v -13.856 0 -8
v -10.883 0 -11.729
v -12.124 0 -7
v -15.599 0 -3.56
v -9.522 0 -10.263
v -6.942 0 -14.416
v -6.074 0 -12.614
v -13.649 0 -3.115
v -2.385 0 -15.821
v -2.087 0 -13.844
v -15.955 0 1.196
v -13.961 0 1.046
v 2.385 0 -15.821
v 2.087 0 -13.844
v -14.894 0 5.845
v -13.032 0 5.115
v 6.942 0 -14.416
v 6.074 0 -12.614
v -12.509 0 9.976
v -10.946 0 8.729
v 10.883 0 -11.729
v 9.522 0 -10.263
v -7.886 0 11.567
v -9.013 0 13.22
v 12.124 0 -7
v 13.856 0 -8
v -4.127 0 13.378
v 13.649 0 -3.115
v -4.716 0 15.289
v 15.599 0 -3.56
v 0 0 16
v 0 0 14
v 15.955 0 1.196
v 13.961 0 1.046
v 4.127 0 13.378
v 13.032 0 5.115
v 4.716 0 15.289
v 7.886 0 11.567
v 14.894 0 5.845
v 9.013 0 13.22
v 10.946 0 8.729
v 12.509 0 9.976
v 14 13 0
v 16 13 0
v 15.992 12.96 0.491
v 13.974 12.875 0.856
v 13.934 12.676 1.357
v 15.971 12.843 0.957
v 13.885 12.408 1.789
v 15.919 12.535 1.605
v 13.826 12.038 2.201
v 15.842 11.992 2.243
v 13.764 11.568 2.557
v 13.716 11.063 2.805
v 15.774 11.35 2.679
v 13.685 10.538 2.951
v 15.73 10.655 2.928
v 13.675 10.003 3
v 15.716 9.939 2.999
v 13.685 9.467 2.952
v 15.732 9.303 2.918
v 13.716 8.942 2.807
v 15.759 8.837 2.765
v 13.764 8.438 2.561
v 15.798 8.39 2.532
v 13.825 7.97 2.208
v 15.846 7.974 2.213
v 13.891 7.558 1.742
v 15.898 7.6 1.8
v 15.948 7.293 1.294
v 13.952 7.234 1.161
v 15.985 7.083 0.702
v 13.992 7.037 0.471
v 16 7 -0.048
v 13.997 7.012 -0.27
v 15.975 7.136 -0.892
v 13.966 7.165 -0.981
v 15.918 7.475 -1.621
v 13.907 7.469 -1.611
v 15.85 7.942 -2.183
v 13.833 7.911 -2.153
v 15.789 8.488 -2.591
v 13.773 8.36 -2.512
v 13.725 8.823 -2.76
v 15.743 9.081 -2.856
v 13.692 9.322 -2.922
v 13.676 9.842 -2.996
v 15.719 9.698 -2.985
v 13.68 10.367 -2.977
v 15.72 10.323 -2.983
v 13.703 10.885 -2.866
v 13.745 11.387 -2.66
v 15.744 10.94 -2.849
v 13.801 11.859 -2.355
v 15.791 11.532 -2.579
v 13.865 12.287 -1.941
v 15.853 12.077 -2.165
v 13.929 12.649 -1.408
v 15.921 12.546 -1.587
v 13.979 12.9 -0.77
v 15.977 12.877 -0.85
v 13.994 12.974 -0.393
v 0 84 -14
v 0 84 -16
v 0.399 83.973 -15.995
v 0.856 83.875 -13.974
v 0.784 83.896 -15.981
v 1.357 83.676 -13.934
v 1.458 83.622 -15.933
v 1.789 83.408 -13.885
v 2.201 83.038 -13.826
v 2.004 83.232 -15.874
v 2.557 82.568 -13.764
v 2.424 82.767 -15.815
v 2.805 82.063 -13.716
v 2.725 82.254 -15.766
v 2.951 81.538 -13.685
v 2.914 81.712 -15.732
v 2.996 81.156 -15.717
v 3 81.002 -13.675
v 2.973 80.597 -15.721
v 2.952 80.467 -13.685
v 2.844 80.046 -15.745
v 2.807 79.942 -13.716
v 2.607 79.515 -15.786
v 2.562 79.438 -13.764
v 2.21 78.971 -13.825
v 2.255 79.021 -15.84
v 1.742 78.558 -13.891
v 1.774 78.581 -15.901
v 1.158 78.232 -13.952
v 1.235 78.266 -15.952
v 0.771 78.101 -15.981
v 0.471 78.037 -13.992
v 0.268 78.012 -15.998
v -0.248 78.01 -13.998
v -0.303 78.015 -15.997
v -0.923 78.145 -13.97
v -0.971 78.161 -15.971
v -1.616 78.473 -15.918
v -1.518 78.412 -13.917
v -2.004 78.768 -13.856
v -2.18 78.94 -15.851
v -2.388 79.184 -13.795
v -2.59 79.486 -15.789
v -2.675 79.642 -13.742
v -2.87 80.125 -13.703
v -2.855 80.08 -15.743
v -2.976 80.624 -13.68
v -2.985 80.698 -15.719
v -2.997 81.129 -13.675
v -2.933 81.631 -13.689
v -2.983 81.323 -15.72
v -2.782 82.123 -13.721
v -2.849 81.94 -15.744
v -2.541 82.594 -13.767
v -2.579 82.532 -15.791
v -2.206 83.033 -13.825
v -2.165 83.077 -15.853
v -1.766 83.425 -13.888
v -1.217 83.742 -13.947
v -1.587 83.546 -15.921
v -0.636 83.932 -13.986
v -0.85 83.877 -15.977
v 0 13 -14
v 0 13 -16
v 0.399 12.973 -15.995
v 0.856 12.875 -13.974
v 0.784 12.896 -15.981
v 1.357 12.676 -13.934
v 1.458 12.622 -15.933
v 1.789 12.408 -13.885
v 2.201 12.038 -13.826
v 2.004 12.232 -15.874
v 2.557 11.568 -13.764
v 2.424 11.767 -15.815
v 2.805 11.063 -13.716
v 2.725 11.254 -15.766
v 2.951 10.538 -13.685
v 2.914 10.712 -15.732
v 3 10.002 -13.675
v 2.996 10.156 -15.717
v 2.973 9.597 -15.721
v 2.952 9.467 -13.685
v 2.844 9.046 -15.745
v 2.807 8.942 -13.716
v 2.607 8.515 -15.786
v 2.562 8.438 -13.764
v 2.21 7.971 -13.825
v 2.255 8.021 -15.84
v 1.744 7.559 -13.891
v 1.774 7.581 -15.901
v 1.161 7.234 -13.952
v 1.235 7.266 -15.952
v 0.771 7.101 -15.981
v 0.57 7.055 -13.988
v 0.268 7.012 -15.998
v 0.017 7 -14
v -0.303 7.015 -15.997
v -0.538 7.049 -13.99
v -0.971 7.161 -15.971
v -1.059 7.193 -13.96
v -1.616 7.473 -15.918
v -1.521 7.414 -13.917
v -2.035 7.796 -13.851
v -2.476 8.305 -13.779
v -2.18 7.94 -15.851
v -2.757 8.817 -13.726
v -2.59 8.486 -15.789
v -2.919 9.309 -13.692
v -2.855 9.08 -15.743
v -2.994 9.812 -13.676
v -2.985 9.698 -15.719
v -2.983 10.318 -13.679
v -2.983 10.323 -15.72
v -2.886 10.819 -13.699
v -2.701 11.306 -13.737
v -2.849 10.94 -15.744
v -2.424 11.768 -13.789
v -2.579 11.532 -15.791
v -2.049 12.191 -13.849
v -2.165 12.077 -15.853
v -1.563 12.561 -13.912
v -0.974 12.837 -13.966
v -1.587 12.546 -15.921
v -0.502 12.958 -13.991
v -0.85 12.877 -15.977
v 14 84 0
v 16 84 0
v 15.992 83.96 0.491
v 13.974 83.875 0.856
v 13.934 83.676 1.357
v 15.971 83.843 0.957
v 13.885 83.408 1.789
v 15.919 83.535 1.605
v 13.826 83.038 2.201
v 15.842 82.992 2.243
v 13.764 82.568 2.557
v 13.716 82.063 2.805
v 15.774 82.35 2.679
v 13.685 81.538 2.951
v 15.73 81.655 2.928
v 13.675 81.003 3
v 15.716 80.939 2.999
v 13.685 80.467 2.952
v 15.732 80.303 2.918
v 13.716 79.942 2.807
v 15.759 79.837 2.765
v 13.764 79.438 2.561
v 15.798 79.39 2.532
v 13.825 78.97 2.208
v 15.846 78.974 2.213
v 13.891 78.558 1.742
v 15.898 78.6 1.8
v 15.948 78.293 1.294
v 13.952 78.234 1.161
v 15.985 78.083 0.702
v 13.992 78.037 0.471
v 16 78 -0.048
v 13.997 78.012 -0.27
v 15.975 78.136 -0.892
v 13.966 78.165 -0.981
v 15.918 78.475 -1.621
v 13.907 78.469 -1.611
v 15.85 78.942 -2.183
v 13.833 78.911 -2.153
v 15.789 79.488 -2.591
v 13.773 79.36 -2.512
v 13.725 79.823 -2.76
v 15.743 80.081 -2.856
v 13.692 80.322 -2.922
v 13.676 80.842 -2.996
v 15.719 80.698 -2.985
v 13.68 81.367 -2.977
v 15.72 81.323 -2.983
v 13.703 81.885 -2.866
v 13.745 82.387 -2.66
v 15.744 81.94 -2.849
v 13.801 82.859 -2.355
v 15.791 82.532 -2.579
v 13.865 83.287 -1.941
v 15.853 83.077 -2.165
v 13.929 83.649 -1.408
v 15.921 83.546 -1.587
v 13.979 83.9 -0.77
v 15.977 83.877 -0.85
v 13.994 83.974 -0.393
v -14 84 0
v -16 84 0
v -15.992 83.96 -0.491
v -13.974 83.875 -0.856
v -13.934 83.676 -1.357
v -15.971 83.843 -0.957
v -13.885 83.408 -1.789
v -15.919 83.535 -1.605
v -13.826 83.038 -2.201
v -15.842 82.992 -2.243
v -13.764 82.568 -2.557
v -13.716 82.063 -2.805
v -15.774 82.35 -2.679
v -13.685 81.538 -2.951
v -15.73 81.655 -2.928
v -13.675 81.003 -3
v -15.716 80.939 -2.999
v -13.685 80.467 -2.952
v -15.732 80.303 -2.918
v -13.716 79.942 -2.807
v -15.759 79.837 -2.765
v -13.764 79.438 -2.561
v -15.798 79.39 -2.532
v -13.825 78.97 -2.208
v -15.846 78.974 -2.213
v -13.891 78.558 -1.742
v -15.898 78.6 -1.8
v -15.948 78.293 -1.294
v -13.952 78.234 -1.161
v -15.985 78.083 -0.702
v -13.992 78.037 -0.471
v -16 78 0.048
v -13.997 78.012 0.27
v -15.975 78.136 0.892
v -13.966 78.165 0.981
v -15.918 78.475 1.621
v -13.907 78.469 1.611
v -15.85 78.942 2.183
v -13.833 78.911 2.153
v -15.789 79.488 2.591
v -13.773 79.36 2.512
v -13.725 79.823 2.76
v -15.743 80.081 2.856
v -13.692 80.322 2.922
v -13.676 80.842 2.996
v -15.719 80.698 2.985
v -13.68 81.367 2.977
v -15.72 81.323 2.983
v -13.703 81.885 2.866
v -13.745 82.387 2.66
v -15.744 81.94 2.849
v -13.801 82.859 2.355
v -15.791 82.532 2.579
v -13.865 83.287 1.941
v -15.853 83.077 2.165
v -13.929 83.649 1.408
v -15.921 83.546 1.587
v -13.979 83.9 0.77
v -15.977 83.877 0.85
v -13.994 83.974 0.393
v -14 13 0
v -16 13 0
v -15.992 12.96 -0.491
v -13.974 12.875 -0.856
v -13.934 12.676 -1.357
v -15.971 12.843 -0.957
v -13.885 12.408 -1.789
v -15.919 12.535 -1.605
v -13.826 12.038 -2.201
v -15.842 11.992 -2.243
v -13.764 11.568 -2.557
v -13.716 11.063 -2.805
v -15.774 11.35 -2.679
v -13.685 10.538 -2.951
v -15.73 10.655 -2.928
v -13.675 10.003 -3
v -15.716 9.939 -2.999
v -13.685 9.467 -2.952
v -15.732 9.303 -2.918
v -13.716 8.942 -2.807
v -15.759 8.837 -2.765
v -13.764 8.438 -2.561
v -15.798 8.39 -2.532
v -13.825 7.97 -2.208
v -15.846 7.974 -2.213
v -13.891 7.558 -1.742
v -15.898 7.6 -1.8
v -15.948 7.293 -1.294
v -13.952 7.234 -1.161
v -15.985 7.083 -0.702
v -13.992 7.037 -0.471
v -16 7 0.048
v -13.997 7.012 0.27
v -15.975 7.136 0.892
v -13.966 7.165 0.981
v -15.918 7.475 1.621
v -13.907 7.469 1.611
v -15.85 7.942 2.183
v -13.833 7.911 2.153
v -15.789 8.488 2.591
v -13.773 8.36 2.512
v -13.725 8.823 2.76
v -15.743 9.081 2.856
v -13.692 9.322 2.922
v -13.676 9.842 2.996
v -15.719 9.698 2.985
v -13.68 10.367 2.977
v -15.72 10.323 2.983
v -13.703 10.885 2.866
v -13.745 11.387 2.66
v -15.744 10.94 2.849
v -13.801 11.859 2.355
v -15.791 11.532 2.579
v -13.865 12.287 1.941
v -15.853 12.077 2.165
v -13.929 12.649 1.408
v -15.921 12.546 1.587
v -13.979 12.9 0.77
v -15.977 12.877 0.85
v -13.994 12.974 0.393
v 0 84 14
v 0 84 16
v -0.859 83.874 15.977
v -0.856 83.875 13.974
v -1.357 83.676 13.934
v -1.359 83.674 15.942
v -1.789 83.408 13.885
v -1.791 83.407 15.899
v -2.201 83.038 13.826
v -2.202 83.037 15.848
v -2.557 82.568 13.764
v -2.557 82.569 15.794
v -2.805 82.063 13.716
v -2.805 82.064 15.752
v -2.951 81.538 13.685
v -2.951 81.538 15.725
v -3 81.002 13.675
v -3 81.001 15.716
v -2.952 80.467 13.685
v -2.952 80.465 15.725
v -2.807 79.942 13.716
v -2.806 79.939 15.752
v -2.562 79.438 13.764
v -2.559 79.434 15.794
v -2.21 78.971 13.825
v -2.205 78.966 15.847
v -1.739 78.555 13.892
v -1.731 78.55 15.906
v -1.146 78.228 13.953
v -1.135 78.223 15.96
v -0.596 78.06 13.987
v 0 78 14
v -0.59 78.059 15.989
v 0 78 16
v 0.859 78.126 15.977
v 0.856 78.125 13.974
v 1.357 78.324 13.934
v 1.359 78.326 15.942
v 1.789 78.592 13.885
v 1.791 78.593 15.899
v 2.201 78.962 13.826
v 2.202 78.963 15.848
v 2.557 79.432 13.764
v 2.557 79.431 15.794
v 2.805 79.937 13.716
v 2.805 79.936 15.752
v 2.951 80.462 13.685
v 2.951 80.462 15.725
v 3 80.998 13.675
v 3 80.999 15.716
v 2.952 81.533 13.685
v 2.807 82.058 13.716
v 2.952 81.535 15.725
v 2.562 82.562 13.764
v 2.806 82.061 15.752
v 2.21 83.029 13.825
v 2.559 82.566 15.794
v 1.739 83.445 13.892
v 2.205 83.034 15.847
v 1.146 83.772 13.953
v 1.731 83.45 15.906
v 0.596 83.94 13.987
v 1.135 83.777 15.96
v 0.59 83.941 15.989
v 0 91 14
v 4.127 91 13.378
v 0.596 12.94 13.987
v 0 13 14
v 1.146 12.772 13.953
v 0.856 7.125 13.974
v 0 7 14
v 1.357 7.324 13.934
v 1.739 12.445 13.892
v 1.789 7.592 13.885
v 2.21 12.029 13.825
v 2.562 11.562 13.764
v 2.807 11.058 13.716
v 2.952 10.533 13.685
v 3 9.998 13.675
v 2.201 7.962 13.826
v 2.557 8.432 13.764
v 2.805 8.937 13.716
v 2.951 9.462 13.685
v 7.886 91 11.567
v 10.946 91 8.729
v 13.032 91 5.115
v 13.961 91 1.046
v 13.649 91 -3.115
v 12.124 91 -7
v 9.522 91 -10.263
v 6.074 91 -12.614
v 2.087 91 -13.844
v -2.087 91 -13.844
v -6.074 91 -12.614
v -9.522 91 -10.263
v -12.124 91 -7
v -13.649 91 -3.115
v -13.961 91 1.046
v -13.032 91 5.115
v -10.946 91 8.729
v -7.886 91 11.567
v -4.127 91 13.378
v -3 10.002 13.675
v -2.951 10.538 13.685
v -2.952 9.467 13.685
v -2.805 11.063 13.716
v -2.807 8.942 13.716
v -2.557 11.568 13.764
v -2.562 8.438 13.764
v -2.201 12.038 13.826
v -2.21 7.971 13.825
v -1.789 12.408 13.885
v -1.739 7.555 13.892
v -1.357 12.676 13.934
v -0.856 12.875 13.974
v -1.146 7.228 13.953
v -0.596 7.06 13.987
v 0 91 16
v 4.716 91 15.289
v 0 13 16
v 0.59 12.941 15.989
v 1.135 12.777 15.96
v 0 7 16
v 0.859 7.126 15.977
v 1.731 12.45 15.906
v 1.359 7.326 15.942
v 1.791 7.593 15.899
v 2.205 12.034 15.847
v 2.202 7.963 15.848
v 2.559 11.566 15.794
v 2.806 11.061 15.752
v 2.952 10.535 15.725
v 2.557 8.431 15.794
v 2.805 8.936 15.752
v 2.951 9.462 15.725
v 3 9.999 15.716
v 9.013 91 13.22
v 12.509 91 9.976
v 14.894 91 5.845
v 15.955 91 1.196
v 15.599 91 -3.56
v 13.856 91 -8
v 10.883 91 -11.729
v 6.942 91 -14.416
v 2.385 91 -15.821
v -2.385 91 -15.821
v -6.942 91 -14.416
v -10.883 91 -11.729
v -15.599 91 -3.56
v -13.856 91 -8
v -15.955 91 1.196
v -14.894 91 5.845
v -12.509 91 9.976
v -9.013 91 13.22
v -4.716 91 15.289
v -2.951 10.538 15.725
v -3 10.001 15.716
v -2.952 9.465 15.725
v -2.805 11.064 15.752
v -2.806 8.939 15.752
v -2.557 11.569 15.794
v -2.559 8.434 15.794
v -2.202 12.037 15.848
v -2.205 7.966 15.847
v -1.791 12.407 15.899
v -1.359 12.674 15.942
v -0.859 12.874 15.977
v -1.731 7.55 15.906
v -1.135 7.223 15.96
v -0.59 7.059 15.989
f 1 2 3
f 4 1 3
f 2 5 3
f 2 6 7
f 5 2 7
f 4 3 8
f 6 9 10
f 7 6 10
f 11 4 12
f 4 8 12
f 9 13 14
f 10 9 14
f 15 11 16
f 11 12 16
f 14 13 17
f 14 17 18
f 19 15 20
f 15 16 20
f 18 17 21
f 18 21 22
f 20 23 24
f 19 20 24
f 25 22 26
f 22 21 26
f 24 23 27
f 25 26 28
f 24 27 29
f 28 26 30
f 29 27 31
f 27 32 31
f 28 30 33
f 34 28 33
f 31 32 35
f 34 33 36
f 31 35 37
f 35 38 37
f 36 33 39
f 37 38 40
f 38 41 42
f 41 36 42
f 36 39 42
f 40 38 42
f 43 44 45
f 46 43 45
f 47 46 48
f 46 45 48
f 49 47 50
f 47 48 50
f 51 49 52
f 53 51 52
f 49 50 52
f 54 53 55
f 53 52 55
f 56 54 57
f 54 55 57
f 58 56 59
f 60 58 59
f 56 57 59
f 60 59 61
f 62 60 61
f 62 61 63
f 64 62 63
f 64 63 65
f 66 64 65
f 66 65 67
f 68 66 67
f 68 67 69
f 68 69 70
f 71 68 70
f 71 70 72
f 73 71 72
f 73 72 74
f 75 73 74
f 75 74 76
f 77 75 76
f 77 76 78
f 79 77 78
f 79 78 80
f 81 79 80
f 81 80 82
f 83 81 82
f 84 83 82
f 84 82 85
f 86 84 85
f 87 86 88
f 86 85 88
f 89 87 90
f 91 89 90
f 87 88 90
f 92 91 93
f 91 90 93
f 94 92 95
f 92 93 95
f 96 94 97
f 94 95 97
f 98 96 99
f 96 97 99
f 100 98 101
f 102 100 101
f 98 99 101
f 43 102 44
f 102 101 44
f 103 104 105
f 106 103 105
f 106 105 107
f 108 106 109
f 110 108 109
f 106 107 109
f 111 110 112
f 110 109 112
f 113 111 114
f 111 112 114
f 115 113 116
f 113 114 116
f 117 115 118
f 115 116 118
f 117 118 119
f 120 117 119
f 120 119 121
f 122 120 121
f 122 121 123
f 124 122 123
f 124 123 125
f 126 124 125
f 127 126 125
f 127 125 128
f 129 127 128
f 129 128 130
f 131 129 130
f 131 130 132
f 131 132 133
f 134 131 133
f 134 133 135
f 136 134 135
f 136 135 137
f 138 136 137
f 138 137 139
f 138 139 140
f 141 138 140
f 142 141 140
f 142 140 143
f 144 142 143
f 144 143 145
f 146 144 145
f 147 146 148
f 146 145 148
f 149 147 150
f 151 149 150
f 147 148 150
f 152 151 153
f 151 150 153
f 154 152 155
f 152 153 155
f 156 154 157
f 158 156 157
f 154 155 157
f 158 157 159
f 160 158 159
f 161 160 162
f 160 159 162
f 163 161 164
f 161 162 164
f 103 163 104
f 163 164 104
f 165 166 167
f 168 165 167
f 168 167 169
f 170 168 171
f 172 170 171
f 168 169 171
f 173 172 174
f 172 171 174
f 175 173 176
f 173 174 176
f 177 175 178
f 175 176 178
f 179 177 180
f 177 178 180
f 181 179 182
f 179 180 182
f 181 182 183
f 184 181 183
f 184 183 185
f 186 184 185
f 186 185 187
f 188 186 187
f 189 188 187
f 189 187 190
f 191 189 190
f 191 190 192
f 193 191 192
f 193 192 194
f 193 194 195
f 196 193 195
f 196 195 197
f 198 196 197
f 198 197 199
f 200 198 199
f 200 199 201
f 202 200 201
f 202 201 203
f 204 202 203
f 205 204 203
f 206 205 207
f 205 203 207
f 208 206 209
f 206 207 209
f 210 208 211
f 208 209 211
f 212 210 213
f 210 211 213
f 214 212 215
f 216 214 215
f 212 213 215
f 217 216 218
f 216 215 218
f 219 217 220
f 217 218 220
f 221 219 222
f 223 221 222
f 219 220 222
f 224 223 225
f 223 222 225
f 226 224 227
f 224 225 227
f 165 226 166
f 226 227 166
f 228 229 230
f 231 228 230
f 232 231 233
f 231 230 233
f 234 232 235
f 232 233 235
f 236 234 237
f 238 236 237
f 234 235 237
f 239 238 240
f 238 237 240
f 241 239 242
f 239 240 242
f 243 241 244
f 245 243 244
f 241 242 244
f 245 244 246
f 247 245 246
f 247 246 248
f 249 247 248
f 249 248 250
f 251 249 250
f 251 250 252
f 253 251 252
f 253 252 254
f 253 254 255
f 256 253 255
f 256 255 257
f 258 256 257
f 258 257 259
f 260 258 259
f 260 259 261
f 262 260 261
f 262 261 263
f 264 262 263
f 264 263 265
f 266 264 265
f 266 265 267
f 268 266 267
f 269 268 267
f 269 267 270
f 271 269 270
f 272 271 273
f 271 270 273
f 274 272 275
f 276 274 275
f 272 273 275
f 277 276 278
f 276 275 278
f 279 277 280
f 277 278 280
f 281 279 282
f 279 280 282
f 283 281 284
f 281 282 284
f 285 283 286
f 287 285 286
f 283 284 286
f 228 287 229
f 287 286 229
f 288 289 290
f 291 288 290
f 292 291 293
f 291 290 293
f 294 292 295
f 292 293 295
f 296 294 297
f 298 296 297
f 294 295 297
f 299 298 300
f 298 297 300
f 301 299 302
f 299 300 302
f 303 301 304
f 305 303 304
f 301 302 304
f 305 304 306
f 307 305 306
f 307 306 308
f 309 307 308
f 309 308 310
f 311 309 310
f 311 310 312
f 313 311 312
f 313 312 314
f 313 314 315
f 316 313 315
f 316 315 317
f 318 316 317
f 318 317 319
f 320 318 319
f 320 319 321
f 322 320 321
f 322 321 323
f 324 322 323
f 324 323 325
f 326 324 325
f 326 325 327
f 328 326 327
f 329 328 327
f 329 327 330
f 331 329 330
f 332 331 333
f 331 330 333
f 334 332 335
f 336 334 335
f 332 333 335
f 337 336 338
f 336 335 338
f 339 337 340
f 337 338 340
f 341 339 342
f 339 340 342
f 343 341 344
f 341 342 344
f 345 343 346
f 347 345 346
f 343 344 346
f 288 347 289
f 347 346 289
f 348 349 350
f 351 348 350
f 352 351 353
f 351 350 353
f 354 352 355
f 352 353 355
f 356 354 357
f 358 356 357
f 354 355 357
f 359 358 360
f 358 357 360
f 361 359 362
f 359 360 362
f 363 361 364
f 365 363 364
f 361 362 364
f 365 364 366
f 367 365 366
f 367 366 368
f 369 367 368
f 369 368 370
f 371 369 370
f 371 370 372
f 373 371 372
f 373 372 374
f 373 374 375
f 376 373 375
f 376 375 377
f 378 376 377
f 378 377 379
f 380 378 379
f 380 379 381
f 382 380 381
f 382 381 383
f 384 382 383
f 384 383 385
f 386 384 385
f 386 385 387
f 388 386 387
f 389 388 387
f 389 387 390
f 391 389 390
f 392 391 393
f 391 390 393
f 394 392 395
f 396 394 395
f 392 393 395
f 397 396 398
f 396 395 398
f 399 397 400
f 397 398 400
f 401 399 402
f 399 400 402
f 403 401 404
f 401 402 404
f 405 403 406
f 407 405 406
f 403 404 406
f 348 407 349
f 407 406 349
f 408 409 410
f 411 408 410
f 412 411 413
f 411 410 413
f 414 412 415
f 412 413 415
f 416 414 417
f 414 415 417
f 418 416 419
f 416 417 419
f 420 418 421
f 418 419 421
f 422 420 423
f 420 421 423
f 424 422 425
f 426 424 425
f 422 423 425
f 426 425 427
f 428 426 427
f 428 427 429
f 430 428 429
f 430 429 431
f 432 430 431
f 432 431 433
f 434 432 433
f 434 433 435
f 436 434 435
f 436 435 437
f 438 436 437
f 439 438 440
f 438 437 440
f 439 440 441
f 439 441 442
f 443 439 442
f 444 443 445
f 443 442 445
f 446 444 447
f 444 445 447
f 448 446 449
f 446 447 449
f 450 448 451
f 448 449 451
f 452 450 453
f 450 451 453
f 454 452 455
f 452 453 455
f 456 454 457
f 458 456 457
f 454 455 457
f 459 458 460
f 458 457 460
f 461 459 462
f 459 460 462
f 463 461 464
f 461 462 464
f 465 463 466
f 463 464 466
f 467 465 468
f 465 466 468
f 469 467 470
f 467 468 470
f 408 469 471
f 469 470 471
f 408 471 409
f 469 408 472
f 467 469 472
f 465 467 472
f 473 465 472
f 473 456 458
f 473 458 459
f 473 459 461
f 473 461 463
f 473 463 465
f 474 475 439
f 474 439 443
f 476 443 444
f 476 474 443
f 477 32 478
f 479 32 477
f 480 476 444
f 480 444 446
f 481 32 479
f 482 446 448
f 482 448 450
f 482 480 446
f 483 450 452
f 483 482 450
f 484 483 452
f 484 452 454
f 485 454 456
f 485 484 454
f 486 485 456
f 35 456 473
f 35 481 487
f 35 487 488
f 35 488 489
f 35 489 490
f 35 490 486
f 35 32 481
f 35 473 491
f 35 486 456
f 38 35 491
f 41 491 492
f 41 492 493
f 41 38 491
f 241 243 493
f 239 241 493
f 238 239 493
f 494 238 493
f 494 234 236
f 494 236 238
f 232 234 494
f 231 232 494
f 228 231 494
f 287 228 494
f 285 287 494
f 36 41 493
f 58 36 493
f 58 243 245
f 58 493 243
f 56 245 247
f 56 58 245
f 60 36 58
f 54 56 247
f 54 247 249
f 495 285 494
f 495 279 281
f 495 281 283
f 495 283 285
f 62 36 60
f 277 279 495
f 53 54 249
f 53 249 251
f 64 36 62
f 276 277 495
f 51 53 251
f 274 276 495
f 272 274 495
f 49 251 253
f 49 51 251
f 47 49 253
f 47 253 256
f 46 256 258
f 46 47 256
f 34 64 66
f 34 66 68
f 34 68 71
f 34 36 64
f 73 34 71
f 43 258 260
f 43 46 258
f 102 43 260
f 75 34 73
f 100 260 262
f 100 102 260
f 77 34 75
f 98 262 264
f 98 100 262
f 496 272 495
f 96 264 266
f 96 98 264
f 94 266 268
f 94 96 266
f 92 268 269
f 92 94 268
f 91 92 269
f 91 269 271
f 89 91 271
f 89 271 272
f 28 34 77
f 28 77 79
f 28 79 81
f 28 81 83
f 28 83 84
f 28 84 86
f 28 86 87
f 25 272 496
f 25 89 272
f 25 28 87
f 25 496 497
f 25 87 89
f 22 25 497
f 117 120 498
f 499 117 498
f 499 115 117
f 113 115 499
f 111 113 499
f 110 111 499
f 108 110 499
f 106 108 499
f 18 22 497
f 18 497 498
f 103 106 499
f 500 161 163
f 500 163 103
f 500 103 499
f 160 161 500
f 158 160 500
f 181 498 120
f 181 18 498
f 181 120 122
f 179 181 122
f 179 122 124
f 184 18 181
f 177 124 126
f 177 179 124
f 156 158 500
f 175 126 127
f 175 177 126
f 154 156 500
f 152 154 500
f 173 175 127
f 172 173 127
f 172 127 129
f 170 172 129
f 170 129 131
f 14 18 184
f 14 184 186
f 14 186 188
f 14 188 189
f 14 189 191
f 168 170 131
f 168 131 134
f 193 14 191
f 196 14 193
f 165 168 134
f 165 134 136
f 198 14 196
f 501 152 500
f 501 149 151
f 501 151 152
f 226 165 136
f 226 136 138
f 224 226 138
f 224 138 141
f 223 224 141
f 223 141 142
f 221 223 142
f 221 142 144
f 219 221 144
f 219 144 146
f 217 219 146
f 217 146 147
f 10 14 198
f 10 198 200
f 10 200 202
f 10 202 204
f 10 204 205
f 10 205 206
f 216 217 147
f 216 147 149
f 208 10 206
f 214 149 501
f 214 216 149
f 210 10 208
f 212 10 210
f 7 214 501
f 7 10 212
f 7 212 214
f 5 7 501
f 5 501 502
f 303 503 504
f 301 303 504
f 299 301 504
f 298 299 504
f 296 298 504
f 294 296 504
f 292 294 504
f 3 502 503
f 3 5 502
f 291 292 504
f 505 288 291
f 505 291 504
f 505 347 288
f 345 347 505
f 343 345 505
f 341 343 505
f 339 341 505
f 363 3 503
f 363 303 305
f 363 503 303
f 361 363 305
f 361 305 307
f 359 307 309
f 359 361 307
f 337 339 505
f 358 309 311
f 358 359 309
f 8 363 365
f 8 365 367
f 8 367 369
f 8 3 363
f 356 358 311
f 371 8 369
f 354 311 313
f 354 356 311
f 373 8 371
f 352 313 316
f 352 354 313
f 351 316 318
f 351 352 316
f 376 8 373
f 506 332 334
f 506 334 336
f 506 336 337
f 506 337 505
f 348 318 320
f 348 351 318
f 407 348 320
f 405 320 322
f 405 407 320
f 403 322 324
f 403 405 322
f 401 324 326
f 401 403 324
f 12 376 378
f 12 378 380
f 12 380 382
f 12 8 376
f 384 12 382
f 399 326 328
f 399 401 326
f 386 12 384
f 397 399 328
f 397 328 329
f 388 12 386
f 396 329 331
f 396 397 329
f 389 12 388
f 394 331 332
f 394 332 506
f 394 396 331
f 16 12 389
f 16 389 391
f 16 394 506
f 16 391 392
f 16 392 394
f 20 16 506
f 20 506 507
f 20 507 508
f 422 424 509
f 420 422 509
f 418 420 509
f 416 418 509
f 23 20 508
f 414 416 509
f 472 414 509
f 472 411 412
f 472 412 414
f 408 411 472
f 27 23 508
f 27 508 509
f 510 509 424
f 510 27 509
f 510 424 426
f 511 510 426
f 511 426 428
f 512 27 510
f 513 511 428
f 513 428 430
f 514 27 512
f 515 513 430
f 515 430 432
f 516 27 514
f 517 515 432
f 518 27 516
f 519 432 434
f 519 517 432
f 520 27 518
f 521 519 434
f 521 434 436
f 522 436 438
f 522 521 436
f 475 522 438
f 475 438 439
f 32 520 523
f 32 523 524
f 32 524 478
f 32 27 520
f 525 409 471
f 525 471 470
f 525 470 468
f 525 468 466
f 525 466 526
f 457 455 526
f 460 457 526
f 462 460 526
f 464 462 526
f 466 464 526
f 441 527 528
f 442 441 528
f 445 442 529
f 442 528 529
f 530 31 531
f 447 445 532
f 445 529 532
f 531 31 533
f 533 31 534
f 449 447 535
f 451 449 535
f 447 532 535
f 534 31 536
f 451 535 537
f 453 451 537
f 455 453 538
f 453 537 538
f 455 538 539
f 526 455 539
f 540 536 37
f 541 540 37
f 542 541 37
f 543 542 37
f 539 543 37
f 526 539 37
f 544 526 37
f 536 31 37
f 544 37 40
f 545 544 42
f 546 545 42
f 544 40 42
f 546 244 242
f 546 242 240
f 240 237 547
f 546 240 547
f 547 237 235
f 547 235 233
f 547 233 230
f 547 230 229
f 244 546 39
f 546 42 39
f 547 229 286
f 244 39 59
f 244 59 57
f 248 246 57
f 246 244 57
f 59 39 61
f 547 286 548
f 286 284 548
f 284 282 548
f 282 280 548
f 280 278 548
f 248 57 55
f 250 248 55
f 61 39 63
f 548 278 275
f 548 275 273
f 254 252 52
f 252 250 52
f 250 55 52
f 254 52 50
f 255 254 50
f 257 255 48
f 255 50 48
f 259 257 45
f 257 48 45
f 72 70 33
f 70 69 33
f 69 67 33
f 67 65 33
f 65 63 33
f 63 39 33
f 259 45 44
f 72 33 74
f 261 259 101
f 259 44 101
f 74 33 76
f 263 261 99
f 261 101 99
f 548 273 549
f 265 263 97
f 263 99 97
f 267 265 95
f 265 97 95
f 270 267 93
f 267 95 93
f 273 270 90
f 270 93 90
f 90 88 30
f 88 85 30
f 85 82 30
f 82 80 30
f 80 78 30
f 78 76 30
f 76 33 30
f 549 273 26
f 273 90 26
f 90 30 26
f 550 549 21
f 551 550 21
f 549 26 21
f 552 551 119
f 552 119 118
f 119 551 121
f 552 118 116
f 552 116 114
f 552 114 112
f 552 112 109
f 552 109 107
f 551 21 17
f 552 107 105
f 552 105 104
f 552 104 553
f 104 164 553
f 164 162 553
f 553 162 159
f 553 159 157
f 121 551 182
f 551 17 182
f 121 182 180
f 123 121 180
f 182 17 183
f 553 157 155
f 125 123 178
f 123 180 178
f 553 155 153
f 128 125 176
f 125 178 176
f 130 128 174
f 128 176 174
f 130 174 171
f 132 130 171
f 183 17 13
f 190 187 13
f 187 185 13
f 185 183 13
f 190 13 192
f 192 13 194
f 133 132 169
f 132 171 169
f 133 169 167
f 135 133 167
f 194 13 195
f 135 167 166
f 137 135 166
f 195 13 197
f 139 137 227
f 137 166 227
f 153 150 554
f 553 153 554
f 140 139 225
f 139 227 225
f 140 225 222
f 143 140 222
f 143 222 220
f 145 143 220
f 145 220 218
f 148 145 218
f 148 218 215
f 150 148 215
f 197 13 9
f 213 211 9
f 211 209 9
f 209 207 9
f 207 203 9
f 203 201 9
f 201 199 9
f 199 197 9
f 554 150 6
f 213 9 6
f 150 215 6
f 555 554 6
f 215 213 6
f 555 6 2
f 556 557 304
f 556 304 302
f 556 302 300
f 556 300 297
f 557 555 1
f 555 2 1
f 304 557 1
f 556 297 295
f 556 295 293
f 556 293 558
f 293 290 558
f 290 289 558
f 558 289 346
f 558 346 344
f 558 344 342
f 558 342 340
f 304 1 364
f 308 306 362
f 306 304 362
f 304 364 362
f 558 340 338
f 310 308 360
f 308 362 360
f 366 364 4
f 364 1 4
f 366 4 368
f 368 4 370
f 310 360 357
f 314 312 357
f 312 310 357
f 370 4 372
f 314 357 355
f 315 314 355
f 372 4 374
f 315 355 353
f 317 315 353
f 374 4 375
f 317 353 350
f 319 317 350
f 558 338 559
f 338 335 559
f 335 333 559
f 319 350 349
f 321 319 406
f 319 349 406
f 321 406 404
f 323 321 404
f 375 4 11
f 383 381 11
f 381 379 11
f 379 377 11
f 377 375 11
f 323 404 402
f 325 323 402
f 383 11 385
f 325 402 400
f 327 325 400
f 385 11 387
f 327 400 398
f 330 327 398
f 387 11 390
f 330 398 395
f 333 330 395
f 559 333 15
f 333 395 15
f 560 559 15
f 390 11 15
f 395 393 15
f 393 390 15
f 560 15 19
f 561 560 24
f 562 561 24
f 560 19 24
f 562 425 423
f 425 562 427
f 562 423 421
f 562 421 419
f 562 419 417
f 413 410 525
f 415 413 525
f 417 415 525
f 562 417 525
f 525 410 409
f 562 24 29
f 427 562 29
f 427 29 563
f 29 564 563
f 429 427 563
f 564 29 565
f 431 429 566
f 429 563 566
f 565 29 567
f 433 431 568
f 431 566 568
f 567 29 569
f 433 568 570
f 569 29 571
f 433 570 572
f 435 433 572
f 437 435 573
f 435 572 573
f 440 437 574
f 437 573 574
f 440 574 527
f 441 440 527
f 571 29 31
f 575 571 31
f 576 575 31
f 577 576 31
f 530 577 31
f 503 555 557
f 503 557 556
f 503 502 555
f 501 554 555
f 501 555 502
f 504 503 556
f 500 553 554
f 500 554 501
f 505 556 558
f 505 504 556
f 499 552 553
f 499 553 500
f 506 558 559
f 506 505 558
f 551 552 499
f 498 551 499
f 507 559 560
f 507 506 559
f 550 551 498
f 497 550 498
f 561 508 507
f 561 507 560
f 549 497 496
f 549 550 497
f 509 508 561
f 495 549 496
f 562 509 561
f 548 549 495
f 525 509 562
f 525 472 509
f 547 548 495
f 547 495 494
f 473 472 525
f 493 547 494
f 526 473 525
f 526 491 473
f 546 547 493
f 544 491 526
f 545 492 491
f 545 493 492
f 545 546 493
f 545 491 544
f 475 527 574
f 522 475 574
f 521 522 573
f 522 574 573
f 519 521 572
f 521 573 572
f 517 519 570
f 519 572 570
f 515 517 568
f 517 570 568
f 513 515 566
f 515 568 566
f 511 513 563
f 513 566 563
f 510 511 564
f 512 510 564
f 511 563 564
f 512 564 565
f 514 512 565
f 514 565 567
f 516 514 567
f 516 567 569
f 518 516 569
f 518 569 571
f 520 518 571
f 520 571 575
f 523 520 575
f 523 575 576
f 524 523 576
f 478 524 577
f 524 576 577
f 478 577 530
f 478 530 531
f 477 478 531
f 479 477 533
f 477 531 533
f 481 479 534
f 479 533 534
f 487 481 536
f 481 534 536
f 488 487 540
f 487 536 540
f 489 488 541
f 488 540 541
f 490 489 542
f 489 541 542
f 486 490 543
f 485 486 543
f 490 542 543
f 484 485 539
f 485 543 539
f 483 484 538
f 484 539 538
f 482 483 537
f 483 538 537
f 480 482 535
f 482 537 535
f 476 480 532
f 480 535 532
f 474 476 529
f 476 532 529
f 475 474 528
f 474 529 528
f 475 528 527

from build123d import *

# Parameters (mm, degrees)
SKETCH1_R           = 16
SKETCH1_R_2         = 14
BOSS_EXTRUDE1_DEPTH = 91
SKETCH2_R           = 3
CUT_EXTRUDE1_DEPTH  = 10
CIRPATTERN1_COUNT   = 4


with BuildPart() as part:
    # Sketch1 → Boss-Extrude1 (new body)
    with BuildSketch(Plane(origin=(0, 0, 0), x_dir=(1, 0, 0), z_dir=(0, 1, 0))):
        with Locations(Location((0, 0, 0), (0, 0, 270))):
            Circle(SKETCH1_R)
        with Locations(Location((0, 0, 0), (0, 0, 270))):
            Circle(SKETCH1_R_2, mode=Mode.SUBTRACT)
    extrude(amount=BOSS_EXTRUDE1_DEPTH)

    # Sketch2 → Cut-Extrude1 (cut)
    with BuildSketch(Plane(origin=(0, 0, -16), x_dir=(-1, 0, 0), z_dir=(0, 0, -1))):
        with Locations(Location((0, 10, 0), (0, 0, 90))):
            Circle(SKETCH2_R)
        with Locations(Location((0, 81, 0), (0, 0, 90))):
            Circle(SKETCH2_R)
    cut_extrude1 = extrude(amount=-CUT_EXTRUDE1_DEPTH, mode=Mode.SUBTRACT)

    # CirPattern1: Cut-Extrude1 ×4 about axis
    cirpattern1_axis = Axis((0, 91, 0), (0, -1, 0))
    for i in range(1, CIRPATTERN1_COUNT):
        add(cut_extrude1.rotate(cirpattern1_axis, i * 360 / CIRPATTERN1_COUNT), mode=Mode.SUBTRACT)


solid = part.part
